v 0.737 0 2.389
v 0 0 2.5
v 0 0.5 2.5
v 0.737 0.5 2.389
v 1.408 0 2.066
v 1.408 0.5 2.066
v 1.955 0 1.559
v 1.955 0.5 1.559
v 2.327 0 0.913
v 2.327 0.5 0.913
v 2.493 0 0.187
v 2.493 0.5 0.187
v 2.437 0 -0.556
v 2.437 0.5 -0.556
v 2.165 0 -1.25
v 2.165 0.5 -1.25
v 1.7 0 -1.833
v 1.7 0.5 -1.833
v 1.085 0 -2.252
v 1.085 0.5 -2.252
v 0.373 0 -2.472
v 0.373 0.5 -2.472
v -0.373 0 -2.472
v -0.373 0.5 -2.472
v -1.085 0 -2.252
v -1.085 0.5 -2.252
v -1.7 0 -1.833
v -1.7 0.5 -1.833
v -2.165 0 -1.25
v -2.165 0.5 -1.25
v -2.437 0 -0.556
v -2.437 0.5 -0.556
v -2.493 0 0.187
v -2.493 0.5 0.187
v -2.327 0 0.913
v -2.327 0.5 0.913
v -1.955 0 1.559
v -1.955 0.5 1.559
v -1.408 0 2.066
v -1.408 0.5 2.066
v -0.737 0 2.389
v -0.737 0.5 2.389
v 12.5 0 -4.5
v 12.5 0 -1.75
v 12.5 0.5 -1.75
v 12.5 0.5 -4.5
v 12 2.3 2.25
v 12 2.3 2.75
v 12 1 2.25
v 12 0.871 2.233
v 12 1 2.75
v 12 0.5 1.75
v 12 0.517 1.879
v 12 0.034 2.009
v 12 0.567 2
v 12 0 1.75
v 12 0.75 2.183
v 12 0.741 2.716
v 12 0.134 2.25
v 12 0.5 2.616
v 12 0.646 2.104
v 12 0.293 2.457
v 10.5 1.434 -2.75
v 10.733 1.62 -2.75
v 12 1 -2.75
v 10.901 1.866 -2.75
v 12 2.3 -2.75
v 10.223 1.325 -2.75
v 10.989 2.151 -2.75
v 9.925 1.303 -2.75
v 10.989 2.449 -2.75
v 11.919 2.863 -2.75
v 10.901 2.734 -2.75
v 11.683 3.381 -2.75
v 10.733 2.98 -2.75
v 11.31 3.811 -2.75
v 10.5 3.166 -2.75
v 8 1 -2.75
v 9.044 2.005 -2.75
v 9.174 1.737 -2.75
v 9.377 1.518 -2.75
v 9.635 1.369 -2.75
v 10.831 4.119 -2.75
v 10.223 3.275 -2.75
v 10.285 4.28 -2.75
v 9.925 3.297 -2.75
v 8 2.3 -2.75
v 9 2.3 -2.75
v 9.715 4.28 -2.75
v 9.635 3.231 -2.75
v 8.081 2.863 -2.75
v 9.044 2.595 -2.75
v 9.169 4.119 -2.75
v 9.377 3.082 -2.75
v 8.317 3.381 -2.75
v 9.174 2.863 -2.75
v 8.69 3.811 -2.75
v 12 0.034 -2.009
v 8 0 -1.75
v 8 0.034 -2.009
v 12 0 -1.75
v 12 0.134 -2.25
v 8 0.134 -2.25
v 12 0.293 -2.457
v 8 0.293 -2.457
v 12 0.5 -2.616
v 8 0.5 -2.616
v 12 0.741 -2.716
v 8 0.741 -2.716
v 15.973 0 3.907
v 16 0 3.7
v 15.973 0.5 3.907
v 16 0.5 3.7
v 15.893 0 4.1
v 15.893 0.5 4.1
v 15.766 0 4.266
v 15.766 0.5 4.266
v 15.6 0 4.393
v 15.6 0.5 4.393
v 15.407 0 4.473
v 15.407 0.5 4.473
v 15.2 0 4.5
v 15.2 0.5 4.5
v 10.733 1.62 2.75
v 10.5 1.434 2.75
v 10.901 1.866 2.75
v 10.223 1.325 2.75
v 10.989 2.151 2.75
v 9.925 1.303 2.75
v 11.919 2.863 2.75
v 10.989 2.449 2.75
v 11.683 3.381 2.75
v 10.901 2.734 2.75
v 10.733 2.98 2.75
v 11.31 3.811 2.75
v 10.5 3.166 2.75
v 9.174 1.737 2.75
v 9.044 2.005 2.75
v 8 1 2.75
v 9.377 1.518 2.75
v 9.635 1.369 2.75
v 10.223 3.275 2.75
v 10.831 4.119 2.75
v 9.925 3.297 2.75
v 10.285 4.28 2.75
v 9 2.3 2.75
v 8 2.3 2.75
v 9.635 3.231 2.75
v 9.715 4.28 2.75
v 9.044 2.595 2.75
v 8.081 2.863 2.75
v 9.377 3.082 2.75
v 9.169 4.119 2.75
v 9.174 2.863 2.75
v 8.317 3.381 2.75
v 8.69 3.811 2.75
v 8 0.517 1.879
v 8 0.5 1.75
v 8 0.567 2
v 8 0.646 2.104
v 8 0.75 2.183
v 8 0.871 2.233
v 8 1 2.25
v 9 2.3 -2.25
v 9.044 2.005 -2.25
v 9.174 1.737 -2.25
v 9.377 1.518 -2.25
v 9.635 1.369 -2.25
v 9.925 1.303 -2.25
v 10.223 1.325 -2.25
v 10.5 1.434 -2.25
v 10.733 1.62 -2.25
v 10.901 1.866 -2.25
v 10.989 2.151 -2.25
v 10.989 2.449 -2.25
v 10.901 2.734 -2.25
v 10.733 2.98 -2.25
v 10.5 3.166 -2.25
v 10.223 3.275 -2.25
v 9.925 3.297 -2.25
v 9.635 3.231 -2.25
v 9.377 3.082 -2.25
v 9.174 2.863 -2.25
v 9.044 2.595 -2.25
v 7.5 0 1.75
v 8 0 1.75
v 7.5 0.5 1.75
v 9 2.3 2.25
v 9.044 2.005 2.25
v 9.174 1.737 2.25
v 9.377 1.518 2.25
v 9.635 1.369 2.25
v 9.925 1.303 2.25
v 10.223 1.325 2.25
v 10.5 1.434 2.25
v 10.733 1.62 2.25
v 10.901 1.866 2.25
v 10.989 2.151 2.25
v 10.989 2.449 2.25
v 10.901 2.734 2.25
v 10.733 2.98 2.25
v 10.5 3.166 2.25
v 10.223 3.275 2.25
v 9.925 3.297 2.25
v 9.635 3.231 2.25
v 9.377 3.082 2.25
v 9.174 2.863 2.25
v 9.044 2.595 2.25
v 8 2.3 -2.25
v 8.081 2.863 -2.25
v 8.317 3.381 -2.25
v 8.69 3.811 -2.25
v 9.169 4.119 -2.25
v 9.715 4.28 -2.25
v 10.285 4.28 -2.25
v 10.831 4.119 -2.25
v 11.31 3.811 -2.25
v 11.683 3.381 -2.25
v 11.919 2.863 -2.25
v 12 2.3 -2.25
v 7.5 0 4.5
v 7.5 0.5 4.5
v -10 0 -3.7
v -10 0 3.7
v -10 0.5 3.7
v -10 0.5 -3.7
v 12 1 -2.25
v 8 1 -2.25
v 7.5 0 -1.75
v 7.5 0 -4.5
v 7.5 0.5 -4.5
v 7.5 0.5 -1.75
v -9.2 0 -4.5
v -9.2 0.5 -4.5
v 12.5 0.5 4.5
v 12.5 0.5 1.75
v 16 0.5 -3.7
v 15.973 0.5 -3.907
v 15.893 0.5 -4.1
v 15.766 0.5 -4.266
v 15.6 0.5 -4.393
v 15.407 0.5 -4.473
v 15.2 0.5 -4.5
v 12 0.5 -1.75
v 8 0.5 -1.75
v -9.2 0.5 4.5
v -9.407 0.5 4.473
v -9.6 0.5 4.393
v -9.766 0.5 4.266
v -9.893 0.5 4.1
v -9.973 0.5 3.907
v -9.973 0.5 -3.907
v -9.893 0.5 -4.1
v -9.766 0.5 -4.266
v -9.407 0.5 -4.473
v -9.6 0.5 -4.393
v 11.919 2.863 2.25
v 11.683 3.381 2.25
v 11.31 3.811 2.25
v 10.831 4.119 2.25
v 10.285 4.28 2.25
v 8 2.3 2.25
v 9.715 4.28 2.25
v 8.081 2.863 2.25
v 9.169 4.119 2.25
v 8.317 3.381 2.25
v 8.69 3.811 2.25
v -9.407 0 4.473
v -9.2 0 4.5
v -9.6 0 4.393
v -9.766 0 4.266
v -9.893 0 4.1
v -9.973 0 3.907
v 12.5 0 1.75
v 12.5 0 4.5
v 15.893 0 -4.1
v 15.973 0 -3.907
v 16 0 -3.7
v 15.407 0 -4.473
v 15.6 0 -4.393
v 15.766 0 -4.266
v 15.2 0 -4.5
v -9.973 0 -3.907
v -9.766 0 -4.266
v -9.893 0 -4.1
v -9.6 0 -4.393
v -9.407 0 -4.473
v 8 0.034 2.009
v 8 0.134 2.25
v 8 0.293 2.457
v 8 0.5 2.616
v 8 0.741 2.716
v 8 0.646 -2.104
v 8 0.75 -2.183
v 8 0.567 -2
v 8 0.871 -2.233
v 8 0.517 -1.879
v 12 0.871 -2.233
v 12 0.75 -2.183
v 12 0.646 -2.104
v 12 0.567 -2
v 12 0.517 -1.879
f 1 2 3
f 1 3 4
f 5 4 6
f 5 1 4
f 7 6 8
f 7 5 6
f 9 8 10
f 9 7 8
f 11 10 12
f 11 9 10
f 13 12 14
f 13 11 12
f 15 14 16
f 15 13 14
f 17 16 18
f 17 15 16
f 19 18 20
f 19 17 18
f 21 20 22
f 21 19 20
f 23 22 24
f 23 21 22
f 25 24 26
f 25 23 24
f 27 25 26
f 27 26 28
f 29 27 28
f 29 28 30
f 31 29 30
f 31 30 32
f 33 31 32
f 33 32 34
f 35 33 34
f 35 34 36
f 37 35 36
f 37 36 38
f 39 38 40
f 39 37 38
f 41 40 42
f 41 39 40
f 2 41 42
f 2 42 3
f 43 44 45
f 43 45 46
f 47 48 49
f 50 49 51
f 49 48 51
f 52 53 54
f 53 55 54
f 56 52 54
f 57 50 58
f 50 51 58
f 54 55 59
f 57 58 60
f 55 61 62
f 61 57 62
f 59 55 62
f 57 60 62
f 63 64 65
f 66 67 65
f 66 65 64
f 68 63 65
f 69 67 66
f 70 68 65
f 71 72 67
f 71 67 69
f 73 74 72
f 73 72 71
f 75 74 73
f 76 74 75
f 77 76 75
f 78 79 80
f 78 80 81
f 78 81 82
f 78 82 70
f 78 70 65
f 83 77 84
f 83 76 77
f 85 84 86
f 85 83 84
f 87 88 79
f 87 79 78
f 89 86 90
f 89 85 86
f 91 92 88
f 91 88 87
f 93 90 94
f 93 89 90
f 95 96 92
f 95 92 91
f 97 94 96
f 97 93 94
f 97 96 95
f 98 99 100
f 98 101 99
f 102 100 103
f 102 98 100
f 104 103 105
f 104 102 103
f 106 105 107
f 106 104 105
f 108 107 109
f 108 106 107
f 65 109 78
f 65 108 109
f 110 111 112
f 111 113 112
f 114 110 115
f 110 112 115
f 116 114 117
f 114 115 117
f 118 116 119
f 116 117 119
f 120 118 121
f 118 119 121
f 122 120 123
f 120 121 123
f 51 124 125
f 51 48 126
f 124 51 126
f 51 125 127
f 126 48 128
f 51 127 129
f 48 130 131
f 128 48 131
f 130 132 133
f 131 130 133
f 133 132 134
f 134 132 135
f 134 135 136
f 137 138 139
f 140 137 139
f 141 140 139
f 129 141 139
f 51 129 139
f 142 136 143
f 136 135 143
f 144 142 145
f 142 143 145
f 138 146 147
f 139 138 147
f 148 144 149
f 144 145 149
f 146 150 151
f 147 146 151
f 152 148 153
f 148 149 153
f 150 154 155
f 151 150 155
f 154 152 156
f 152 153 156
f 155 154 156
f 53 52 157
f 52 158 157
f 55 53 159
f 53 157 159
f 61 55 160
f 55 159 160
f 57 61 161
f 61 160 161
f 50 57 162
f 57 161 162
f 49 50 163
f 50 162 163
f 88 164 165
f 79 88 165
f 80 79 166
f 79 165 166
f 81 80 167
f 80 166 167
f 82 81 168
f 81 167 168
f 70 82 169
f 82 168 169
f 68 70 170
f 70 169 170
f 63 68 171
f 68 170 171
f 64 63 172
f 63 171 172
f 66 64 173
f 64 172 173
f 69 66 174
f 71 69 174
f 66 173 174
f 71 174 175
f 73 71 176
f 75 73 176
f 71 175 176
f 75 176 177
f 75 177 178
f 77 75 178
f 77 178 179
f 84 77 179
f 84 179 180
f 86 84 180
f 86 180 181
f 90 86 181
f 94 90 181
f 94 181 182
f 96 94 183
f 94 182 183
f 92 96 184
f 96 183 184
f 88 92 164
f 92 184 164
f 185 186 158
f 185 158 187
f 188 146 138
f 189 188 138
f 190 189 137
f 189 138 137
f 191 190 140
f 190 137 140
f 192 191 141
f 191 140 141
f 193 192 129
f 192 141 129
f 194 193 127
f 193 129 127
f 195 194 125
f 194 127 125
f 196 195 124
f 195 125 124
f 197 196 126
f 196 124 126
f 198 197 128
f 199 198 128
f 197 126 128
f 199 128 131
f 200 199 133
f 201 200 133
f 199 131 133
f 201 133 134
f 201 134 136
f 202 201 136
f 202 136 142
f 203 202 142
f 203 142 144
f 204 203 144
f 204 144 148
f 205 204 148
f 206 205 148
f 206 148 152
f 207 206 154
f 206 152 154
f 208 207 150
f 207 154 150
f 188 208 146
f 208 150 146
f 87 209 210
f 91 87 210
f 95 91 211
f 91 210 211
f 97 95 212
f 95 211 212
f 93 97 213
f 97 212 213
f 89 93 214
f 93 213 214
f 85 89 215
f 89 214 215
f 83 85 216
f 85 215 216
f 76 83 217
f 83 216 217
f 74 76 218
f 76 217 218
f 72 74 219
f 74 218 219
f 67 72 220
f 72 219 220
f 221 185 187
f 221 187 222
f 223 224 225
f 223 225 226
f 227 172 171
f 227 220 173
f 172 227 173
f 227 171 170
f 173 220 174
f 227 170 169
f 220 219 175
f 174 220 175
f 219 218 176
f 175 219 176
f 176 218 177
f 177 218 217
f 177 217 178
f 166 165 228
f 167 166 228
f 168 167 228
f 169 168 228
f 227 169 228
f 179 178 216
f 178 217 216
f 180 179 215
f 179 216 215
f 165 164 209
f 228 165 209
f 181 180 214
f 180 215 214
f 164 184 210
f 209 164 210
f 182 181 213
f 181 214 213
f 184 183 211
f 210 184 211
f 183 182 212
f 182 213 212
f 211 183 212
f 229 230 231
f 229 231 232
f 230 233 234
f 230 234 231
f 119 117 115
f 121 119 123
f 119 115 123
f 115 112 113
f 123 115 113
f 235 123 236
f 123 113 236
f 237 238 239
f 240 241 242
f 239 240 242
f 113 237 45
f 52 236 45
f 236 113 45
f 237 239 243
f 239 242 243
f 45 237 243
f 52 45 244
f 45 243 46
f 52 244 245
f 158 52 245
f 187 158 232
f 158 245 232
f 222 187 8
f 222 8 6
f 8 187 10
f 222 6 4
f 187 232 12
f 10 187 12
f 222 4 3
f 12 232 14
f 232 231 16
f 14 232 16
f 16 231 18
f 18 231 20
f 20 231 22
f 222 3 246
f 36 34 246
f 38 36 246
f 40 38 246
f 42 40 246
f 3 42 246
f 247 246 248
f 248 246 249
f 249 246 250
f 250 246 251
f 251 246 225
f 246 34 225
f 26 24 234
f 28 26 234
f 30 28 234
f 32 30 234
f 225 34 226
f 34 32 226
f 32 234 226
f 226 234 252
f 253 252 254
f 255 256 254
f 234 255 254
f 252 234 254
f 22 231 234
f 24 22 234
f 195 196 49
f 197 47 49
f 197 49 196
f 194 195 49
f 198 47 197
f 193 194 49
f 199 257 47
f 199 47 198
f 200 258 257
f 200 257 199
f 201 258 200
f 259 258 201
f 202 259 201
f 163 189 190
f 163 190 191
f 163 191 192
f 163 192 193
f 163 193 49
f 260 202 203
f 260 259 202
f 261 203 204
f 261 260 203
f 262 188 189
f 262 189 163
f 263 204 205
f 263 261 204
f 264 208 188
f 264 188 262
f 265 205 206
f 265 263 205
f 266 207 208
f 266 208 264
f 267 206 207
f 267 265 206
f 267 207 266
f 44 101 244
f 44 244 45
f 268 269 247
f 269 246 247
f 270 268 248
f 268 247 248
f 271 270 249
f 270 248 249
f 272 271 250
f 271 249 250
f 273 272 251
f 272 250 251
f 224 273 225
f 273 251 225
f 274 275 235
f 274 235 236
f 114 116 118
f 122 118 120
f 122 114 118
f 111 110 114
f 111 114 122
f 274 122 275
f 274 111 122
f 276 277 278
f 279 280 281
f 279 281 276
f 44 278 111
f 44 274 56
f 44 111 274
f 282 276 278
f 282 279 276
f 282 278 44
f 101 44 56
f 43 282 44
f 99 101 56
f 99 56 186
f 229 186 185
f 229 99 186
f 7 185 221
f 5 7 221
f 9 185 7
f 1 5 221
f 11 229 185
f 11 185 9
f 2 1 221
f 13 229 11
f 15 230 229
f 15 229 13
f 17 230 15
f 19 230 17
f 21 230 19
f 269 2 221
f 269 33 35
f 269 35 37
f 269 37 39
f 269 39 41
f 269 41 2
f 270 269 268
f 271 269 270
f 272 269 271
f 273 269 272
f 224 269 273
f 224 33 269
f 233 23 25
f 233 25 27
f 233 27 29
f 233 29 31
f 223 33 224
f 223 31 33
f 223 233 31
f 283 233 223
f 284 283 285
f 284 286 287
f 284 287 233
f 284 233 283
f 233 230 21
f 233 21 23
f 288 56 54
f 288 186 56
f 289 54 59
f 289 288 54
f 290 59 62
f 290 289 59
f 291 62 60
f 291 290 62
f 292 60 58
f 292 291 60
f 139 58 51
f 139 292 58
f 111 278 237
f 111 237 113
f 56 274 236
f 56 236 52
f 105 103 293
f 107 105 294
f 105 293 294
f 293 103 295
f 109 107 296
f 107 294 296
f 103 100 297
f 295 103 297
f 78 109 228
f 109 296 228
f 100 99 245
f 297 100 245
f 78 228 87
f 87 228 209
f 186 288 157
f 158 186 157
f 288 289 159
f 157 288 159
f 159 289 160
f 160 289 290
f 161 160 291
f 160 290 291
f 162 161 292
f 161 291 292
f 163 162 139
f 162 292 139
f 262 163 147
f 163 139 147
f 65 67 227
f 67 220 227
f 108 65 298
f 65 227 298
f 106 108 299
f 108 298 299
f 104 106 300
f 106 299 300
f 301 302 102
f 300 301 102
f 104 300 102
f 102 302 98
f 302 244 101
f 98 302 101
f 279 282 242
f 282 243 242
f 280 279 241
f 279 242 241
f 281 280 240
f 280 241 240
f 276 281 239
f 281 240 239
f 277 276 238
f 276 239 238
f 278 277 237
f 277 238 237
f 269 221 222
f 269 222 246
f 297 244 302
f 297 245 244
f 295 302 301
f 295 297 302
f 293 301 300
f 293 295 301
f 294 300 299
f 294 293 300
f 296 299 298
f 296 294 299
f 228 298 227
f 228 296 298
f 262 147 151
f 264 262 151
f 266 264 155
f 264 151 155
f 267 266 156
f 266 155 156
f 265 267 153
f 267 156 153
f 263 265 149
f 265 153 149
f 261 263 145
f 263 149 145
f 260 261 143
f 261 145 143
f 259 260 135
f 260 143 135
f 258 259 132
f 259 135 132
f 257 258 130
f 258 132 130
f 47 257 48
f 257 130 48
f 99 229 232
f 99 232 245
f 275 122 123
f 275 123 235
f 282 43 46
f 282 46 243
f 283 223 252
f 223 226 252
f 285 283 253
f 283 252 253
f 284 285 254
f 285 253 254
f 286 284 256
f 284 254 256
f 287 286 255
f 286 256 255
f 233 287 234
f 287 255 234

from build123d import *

# Parameters (mm, degrees)
SKETCH_1_R      = 2.5
EXTRUDE_1_DEPTH = 0.5
EXTRUDE_START   = 2.75
SKETCH_2_R      = 1
EXTRUDE_2_DEPTH = 0.5
EXTRUDE_START_2 = -2.25
SKETCH_2_2_R    = 1
EXTRUDE_3_DEPTH = 0.5
FILLET_1_R      = 0.8
FILLET_2_R      = 0.5
FILLET_4_R      = 1


with BuildPart() as part:
    # Эскиз1 → Бобышка-Вытянуть1 (new body)
    with BuildSketch(Plane(origin=(0, 0, 0), x_dir=(1, 0, 0), z_dir=(0, 1, 0))):
        Polygon((-10, 4.5), (7.5, 4.5), (7.5, 1.75), (8, 1.75), (8, 2.75), (12, 2.75), (12, 1.75), (12.5, 1.75), (12.5, 4.5), (16, 4.5), (16, -4.5), (12.5, -4.5), (12.5, -1.75), (12, -1.75), (12, -2.75), (8, -2.75), (8, -1.75), (7.5, -1.75), (7.5, -4.5), (-10, -4.5), align=None)
        with Locations(Location((0, 0, 0), (0, 0, 270))):
            Circle(SKETCH_1_R, mode=Mode.SUBTRACT)
    extrude(amount=EXTRUDE_1_DEPTH)

    # Эскиз2 → Бобышка-Вытянуть2 (add)
    with BuildSketch(Plane.XY.offset(EXTRUDE_START)):
        with BuildLine():
            Line((8, 0.5), (8, 2.3))
            ThreePointArc((8, 2.3), (10, 4.3), (12, 2.3))
            Line((12, 2.3), (12, 0.5))
            Line((12, 0.5), (8, 0.5))
        make_face()
        with Locations(Location((10, 2.3, 0), (0, 0, 180))):
            Circle(SKETCH_2_R, mode=Mode.SUBTRACT)
    extrude(amount=-EXTRUDE_2_DEPTH)

    # Эскиз2<2> → Бобышка-Вытянуть3 (add)
    with BuildSketch(Plane.XY.offset(EXTRUDE_START_2)):
        with BuildLine():
            Line((8, 0.5), (8, 2.3))
            ThreePointArc((8, 2.3), (10, 4.3), (12, 2.3))
            Line((12, 2.3), (12, 0.5))
            Line((12, 0.5), (8, 0.5))
        make_face()
        with Locations(Location((10, 2.3, 0), (0, 0, 180))):
            Circle(SKETCH_2_2_R, mode=Mode.SUBTRACT)
    extrude(amount=-EXTRUDE_3_DEPTH)

    # Скругление1
    fillet_1_edges = [part.edges().sort_by_distance(p)[0] for p in [
        (-10, 0.25, 4.5),
        (-10, 0.25, -4.5),
        (16, 0.25, -4.5),
        (16, 0.25, 4.5),
    ]]
    fillet(fillet_1_edges, radius=FILLET_1_R)

    # Скругление2
    fillet_2_edges = [part.edges().sort_by_distance(p)[0] for p in [
        (10, 0.5, 2.25),
        (10, 0.5, -2.25),
    ]]
    fillet(fillet_2_edges, radius=FILLET_2_R)

    # Скругление4
    fillet_4_edges = [part.edges().sort_by_distance(p)[0] for p in [
        (10, 0, 2.75),
        (10, 0, -2.75),
    ]]
    fillet(fillet_4_edges, radius=FILLET_4_R)


solid = part.part
